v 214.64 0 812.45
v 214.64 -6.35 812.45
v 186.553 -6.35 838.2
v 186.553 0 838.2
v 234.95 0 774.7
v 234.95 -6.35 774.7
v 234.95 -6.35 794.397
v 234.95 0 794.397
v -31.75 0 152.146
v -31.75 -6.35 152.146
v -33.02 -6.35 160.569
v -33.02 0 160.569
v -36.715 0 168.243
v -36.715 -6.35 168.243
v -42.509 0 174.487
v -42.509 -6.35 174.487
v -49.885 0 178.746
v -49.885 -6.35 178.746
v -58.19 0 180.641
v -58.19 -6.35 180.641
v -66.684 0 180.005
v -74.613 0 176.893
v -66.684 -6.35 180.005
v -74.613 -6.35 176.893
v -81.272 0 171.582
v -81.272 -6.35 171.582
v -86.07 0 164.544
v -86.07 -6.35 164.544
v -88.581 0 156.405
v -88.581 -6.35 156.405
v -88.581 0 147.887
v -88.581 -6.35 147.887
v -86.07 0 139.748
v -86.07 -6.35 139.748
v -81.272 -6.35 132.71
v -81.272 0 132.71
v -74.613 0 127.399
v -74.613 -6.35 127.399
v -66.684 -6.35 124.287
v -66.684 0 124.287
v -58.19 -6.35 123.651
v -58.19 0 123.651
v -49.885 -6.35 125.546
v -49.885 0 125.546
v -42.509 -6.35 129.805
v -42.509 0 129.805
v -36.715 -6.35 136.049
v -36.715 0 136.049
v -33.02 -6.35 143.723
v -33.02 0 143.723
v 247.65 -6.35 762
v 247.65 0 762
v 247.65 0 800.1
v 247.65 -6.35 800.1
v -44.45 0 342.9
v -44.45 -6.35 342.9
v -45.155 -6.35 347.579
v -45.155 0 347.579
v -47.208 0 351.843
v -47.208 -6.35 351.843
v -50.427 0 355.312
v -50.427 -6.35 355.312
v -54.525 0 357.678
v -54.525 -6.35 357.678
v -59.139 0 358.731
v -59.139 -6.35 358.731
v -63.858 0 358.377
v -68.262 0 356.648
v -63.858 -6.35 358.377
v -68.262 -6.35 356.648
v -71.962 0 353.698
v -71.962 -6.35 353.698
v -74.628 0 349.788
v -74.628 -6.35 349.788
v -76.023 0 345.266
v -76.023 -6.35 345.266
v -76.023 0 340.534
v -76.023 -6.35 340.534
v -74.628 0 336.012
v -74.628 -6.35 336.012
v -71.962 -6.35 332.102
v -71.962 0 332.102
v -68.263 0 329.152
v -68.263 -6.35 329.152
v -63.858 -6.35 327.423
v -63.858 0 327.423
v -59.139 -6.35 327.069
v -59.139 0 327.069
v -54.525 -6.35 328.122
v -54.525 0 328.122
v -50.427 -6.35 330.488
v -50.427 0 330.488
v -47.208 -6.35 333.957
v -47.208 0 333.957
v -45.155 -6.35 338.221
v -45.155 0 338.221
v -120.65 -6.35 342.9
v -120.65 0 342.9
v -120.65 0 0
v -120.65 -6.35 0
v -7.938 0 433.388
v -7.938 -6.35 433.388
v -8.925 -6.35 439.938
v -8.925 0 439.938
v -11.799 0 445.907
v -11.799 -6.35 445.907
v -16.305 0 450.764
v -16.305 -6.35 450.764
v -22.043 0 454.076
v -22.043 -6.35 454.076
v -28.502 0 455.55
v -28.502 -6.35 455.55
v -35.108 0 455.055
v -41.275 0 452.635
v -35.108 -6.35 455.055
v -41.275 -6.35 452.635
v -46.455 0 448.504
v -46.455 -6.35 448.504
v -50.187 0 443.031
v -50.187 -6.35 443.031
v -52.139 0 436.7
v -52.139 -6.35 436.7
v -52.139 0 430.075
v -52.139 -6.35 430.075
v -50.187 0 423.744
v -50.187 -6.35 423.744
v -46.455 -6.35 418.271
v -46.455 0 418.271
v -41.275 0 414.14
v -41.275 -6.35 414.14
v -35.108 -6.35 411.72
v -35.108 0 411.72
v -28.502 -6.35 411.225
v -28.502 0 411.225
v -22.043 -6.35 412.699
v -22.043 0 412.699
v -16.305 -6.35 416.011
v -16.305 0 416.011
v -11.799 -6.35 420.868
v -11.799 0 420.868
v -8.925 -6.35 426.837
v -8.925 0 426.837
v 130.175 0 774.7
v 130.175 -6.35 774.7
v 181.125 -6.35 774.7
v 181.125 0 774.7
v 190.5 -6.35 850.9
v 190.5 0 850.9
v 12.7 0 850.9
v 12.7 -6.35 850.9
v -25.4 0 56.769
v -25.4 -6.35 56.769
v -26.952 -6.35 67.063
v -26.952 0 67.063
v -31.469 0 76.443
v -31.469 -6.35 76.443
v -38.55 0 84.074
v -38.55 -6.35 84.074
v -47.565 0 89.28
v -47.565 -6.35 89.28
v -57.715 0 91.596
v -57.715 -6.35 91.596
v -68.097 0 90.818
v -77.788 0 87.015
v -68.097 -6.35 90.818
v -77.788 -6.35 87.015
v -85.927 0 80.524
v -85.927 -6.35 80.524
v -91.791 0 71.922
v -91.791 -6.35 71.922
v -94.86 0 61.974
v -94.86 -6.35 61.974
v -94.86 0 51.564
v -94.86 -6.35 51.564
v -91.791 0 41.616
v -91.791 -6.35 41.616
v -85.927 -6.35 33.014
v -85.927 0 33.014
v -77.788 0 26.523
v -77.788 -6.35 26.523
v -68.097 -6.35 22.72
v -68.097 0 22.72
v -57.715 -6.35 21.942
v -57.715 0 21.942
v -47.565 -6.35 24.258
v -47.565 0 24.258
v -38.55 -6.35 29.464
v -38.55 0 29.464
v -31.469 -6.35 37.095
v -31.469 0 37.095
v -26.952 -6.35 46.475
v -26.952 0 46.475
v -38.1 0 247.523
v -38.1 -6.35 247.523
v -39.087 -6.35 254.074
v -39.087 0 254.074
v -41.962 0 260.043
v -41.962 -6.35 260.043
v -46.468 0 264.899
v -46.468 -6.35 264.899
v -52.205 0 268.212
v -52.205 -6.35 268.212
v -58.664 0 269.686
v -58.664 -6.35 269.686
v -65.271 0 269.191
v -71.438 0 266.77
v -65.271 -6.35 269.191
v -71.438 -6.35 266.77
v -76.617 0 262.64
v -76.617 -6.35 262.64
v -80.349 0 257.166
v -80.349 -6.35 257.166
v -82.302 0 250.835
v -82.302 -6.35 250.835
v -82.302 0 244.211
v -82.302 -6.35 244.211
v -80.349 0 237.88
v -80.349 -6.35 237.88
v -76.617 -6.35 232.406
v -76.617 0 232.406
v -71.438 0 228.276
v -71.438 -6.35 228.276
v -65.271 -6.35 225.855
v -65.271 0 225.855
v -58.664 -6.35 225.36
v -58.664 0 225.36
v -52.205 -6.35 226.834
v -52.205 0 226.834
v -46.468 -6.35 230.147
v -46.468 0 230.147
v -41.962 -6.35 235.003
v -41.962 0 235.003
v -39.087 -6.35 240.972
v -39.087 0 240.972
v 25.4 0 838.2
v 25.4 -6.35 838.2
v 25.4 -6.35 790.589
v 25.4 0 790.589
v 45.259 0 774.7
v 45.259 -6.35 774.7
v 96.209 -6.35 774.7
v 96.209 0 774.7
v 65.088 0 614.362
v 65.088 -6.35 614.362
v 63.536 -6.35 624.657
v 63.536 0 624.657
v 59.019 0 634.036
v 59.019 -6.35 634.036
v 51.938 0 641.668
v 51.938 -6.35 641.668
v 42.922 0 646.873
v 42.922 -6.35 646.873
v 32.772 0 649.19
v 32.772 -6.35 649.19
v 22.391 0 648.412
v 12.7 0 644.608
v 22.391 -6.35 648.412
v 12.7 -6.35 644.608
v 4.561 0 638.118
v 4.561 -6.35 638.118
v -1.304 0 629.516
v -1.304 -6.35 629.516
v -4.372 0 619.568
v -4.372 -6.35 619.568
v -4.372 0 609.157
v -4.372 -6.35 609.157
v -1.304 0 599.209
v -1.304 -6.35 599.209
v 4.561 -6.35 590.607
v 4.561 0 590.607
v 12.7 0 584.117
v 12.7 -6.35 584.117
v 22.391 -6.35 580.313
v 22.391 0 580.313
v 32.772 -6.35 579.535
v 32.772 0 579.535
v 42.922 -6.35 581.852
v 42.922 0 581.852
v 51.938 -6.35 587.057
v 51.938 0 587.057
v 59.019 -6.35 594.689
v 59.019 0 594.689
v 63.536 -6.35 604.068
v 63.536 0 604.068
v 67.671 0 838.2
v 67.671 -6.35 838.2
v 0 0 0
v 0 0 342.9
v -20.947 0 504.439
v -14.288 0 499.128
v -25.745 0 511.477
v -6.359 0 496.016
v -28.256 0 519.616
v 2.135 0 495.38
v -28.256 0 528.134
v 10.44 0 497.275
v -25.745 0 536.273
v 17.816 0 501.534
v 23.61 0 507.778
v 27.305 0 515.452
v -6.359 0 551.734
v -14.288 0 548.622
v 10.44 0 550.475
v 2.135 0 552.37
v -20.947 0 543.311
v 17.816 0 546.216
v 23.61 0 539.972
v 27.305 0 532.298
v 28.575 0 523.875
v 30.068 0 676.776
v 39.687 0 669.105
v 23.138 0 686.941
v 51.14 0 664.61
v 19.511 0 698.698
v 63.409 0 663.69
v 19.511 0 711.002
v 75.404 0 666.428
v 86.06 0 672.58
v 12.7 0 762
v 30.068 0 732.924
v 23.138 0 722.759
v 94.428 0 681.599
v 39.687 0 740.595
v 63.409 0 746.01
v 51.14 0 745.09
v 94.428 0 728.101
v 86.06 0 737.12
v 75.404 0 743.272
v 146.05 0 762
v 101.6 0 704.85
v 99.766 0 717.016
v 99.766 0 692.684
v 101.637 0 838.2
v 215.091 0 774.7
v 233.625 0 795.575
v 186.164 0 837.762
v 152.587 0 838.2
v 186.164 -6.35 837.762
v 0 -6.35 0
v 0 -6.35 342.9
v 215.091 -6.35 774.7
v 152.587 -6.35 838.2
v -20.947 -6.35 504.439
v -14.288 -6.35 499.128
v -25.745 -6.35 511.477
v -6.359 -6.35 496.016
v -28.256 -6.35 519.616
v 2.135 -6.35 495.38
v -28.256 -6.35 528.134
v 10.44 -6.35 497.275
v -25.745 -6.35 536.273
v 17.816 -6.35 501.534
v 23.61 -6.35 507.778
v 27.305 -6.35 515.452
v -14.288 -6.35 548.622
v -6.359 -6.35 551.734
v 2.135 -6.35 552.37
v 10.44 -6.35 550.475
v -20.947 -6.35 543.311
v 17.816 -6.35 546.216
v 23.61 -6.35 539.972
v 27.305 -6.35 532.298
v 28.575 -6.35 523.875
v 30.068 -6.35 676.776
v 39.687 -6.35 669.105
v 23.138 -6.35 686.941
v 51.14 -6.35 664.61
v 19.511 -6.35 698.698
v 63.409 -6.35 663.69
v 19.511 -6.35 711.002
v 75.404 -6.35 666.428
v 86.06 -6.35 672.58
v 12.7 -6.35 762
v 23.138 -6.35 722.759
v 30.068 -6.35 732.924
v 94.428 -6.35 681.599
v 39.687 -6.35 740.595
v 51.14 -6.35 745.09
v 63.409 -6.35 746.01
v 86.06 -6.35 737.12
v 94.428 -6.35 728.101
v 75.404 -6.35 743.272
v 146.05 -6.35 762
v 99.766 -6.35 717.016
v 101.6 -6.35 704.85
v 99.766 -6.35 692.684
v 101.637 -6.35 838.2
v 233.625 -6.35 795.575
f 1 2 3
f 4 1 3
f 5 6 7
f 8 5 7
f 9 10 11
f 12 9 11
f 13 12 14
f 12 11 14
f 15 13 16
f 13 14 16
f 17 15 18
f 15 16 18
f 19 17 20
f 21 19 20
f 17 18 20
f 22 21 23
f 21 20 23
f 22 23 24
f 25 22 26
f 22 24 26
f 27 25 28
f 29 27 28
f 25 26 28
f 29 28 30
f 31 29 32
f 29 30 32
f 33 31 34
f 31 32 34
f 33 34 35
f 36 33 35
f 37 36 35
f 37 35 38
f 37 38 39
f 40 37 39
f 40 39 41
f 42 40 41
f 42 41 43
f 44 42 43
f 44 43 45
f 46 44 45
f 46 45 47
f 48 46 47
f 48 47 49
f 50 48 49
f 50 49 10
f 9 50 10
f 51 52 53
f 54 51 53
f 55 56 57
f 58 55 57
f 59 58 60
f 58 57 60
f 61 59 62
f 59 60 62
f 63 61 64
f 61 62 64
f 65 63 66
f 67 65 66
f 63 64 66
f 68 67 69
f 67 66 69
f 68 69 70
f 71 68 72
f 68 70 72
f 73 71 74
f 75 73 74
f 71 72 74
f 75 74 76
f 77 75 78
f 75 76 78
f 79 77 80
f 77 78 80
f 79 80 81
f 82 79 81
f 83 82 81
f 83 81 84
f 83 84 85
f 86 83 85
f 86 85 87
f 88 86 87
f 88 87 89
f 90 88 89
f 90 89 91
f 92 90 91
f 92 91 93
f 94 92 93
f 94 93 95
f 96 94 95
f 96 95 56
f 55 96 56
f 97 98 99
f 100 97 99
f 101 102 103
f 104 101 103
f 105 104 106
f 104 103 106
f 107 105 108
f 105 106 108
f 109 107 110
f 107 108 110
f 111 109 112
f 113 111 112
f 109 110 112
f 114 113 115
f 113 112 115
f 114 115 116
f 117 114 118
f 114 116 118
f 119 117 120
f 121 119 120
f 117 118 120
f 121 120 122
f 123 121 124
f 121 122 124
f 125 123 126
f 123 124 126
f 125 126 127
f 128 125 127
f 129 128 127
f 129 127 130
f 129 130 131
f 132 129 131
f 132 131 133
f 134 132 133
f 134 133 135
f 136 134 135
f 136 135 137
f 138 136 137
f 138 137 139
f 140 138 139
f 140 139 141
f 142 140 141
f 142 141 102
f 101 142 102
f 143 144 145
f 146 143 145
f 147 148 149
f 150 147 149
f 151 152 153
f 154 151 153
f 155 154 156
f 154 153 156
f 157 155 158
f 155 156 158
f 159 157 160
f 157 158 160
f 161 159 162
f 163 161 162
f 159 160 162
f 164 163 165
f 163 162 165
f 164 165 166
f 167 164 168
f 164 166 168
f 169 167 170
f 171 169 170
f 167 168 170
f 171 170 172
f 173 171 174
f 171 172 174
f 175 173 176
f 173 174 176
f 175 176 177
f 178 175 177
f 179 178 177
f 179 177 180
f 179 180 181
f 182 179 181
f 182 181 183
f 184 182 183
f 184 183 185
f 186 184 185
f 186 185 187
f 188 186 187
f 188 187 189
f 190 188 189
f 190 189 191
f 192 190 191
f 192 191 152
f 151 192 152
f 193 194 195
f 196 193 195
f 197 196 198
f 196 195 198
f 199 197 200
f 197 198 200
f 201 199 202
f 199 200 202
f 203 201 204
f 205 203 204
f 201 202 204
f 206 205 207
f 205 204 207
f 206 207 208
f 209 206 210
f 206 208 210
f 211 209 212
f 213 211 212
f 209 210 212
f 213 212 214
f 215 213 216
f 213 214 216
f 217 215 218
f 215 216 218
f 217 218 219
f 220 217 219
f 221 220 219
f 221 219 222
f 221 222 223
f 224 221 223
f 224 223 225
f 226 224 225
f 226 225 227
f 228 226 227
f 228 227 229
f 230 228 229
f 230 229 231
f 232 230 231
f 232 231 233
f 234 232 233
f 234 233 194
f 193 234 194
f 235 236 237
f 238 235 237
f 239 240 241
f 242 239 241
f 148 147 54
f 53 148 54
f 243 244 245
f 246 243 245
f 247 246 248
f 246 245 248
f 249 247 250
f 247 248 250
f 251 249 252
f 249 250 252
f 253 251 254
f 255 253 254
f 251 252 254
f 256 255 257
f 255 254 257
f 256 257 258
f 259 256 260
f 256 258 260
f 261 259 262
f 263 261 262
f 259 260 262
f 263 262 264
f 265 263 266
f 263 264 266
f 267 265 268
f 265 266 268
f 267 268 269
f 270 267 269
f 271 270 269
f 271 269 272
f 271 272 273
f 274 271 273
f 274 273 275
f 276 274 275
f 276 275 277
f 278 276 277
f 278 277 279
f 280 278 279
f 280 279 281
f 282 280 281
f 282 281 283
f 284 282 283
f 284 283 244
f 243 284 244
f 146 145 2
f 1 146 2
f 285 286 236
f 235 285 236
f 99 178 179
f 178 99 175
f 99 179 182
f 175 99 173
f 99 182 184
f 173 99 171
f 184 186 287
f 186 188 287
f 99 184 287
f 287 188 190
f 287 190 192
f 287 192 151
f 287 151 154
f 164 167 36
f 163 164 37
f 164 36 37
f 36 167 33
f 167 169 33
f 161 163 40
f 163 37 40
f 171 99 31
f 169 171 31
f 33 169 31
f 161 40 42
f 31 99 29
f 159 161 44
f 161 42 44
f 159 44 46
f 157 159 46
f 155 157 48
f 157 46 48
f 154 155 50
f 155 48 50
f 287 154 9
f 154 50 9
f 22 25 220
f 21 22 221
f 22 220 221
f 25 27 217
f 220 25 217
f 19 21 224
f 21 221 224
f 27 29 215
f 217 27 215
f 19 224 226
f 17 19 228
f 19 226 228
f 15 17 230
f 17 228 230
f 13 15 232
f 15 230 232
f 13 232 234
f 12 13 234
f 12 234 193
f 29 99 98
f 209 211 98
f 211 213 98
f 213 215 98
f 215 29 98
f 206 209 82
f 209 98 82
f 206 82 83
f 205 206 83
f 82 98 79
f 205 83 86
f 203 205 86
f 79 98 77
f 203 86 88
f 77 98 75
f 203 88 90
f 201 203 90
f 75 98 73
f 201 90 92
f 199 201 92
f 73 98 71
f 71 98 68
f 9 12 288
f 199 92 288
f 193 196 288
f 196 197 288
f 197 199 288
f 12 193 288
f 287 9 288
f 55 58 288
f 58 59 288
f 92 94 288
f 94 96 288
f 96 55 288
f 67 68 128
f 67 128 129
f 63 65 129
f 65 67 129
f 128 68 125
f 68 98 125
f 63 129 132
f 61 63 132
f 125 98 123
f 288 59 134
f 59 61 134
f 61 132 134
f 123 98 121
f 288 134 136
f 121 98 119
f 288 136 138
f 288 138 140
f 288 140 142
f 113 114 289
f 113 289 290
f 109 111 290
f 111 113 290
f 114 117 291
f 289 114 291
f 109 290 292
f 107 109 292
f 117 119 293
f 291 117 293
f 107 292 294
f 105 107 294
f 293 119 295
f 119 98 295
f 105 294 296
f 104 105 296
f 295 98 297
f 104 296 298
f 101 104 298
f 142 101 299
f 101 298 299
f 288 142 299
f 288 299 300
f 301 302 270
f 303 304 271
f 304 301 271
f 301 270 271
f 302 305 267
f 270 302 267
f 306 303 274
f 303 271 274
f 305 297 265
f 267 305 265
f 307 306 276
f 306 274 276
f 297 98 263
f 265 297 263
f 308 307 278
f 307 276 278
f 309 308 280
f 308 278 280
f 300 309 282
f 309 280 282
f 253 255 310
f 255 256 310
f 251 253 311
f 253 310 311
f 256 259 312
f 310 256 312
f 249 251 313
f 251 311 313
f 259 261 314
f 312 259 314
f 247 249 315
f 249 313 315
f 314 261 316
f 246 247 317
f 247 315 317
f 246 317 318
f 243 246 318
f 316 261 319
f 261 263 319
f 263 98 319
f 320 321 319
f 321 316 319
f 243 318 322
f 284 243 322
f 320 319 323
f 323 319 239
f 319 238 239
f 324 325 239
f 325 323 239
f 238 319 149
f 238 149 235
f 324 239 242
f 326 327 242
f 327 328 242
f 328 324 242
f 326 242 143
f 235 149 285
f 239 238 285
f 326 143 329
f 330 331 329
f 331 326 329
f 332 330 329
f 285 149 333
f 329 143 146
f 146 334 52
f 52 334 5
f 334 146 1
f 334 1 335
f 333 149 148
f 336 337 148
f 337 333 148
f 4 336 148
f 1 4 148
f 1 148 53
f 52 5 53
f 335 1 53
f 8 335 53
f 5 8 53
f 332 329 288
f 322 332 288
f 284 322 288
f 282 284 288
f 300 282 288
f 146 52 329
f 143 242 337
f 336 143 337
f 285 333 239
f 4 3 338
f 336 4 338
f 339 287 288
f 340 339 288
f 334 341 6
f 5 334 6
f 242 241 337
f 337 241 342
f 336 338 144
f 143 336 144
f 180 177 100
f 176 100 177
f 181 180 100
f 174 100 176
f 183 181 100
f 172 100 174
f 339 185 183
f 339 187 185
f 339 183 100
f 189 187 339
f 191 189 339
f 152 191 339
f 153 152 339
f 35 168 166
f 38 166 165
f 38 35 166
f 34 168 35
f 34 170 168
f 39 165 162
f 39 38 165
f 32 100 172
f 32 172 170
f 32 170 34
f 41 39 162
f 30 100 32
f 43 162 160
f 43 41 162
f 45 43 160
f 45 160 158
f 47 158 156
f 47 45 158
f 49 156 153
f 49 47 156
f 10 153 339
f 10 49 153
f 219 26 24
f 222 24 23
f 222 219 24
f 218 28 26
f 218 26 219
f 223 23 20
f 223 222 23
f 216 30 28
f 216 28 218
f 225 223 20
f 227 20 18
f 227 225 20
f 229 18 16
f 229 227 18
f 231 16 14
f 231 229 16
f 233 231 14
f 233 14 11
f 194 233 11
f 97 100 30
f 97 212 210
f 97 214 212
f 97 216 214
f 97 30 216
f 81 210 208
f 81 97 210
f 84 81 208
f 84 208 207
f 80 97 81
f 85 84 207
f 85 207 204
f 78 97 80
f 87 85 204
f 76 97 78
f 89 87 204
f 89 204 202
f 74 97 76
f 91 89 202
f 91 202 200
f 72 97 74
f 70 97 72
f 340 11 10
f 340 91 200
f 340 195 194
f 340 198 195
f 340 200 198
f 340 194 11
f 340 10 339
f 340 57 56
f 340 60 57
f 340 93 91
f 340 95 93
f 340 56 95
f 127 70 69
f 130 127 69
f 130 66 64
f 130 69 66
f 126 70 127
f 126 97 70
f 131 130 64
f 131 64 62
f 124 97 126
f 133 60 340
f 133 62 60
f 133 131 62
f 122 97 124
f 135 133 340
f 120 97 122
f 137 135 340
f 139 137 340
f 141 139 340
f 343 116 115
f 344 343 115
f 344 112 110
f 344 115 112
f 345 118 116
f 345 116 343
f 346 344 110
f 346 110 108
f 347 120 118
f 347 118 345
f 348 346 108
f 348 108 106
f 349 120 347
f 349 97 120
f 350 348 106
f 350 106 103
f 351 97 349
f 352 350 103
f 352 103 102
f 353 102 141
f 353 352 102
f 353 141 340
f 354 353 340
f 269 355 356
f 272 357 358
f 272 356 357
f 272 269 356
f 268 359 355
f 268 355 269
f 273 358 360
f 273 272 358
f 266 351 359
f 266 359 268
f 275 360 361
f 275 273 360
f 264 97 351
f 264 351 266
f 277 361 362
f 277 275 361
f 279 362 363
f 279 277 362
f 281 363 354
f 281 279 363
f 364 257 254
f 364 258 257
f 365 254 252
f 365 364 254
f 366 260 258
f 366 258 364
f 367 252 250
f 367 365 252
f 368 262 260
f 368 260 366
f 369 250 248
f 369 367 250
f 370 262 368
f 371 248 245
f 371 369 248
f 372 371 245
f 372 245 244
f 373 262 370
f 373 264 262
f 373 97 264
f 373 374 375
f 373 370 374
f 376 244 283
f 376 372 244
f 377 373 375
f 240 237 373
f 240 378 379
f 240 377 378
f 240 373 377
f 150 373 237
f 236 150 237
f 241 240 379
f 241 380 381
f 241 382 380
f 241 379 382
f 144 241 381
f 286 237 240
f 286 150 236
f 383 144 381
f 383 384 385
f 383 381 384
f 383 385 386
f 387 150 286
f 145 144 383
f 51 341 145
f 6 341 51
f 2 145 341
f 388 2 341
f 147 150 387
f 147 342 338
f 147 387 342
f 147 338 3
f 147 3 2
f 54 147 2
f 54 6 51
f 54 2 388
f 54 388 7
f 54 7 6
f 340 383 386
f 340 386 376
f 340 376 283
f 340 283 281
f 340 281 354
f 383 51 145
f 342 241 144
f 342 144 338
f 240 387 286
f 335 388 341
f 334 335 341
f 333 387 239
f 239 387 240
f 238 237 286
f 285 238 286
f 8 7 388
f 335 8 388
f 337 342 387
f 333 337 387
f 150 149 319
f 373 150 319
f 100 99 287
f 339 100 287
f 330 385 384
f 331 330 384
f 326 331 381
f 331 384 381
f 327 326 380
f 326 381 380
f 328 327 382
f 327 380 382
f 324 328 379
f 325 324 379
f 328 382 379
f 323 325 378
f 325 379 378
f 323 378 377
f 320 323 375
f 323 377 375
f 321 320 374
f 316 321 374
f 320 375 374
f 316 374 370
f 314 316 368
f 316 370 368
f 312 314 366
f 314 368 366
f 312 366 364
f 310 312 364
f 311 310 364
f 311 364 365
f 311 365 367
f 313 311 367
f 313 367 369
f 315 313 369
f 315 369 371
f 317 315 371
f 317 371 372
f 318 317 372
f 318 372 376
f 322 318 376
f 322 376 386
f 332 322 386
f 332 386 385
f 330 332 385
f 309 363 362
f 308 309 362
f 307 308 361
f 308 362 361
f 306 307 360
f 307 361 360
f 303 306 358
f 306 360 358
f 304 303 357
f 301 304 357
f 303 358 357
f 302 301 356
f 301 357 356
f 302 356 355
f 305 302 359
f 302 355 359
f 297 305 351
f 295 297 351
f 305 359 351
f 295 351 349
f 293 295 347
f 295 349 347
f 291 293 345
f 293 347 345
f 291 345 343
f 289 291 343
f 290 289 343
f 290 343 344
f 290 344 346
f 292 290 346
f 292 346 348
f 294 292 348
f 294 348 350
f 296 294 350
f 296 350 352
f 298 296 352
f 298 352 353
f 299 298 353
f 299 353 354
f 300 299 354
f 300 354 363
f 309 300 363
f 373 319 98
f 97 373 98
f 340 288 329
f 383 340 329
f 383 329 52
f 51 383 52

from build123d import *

# Parameters (mm, degrees)
F1_DEPTH = 6.35
F3_DEPTH = 25.4
F4_R     = 15.875
F4_R_2   = 22.225
F4_R_3   = 41.275
F4_R_4   = 28.575
F4_R_5   = 34.925
F5_DEPTH = 25.4


with BuildPart() as f1:
    # F0 (on Front) → F1 (new body)
    with BuildSketch(Plane.XZ):
        Polygon((-120.65, 342.9), (-120.65, 0), (0, 0), (0, 342.9), (146.05, 762), (12.7, 762), align=None)
        Polygon((12.7, 850.9), (12.7, 762), (146.05, 762), (247.65, 762), (247.65, 850.9), align=None)
    extrude(amount=F1_DEPTH)

    # F2 (on face) → F3 (cut)
    with BuildSketch(Plane.XZ.offset(6.35)):
        Polygon((247.65, 850.9), (190.5, 850.9), (247.65, 800.1), align=None)
    extrude(amount=-F3_DEPTH, mode=Mode.SUBTRACT)

    # F4 (on face) → F5 (cut)
    with BuildSketch(Plane.XZ.offset(6.35)):
        with Locations((-60.325, 342.9)):
            Circle(F4_R)
        with Locations((-30.1625, 433.3875)):
            Circle(F4_R_2)
        with Locations((60.325, 704.85)):
            Circle(F4_R_3)
        Polygon((186.552938, 838.2), (186.164132, 837.762077), (214.640432, 812.44981), align=None)
        Polygon((234.95, 794.396861), (233.624632, 795.574966), (215.09097, 774.7), (234.95, 774.7), align=None)
        with Locations((0, 523.875)):
            Circle(F4_R_4)
        with Locations((30.1625, 614.3625)):
            Circle(F4_R_5)
        Polygon((67.670581, 838.2), (25.4, 838.2), (25.4, 790.589499), align=None)
        Polygon((152.58655, 838.2), (101.636968, 838.2), (45.25903, 774.7), (96.208612, 774.7), align=None)
        Polygon((214.640432, 812.44981), (186.164132, 837.762077), (130.175, 774.7), (181.124582, 774.7), align=None)
        with Locations((-60.325, 247.523)):
            Circle(F4_R_2)
        with Locations((-60.325, 152.146)):
            Circle(F4_R_4)
        with Locations((-60.325, 56.769)):
            Circle(F4_R_5)
    extrude(amount=-F5_DEPTH, mode=Mode.SUBTRACT)


solid = f1.part
